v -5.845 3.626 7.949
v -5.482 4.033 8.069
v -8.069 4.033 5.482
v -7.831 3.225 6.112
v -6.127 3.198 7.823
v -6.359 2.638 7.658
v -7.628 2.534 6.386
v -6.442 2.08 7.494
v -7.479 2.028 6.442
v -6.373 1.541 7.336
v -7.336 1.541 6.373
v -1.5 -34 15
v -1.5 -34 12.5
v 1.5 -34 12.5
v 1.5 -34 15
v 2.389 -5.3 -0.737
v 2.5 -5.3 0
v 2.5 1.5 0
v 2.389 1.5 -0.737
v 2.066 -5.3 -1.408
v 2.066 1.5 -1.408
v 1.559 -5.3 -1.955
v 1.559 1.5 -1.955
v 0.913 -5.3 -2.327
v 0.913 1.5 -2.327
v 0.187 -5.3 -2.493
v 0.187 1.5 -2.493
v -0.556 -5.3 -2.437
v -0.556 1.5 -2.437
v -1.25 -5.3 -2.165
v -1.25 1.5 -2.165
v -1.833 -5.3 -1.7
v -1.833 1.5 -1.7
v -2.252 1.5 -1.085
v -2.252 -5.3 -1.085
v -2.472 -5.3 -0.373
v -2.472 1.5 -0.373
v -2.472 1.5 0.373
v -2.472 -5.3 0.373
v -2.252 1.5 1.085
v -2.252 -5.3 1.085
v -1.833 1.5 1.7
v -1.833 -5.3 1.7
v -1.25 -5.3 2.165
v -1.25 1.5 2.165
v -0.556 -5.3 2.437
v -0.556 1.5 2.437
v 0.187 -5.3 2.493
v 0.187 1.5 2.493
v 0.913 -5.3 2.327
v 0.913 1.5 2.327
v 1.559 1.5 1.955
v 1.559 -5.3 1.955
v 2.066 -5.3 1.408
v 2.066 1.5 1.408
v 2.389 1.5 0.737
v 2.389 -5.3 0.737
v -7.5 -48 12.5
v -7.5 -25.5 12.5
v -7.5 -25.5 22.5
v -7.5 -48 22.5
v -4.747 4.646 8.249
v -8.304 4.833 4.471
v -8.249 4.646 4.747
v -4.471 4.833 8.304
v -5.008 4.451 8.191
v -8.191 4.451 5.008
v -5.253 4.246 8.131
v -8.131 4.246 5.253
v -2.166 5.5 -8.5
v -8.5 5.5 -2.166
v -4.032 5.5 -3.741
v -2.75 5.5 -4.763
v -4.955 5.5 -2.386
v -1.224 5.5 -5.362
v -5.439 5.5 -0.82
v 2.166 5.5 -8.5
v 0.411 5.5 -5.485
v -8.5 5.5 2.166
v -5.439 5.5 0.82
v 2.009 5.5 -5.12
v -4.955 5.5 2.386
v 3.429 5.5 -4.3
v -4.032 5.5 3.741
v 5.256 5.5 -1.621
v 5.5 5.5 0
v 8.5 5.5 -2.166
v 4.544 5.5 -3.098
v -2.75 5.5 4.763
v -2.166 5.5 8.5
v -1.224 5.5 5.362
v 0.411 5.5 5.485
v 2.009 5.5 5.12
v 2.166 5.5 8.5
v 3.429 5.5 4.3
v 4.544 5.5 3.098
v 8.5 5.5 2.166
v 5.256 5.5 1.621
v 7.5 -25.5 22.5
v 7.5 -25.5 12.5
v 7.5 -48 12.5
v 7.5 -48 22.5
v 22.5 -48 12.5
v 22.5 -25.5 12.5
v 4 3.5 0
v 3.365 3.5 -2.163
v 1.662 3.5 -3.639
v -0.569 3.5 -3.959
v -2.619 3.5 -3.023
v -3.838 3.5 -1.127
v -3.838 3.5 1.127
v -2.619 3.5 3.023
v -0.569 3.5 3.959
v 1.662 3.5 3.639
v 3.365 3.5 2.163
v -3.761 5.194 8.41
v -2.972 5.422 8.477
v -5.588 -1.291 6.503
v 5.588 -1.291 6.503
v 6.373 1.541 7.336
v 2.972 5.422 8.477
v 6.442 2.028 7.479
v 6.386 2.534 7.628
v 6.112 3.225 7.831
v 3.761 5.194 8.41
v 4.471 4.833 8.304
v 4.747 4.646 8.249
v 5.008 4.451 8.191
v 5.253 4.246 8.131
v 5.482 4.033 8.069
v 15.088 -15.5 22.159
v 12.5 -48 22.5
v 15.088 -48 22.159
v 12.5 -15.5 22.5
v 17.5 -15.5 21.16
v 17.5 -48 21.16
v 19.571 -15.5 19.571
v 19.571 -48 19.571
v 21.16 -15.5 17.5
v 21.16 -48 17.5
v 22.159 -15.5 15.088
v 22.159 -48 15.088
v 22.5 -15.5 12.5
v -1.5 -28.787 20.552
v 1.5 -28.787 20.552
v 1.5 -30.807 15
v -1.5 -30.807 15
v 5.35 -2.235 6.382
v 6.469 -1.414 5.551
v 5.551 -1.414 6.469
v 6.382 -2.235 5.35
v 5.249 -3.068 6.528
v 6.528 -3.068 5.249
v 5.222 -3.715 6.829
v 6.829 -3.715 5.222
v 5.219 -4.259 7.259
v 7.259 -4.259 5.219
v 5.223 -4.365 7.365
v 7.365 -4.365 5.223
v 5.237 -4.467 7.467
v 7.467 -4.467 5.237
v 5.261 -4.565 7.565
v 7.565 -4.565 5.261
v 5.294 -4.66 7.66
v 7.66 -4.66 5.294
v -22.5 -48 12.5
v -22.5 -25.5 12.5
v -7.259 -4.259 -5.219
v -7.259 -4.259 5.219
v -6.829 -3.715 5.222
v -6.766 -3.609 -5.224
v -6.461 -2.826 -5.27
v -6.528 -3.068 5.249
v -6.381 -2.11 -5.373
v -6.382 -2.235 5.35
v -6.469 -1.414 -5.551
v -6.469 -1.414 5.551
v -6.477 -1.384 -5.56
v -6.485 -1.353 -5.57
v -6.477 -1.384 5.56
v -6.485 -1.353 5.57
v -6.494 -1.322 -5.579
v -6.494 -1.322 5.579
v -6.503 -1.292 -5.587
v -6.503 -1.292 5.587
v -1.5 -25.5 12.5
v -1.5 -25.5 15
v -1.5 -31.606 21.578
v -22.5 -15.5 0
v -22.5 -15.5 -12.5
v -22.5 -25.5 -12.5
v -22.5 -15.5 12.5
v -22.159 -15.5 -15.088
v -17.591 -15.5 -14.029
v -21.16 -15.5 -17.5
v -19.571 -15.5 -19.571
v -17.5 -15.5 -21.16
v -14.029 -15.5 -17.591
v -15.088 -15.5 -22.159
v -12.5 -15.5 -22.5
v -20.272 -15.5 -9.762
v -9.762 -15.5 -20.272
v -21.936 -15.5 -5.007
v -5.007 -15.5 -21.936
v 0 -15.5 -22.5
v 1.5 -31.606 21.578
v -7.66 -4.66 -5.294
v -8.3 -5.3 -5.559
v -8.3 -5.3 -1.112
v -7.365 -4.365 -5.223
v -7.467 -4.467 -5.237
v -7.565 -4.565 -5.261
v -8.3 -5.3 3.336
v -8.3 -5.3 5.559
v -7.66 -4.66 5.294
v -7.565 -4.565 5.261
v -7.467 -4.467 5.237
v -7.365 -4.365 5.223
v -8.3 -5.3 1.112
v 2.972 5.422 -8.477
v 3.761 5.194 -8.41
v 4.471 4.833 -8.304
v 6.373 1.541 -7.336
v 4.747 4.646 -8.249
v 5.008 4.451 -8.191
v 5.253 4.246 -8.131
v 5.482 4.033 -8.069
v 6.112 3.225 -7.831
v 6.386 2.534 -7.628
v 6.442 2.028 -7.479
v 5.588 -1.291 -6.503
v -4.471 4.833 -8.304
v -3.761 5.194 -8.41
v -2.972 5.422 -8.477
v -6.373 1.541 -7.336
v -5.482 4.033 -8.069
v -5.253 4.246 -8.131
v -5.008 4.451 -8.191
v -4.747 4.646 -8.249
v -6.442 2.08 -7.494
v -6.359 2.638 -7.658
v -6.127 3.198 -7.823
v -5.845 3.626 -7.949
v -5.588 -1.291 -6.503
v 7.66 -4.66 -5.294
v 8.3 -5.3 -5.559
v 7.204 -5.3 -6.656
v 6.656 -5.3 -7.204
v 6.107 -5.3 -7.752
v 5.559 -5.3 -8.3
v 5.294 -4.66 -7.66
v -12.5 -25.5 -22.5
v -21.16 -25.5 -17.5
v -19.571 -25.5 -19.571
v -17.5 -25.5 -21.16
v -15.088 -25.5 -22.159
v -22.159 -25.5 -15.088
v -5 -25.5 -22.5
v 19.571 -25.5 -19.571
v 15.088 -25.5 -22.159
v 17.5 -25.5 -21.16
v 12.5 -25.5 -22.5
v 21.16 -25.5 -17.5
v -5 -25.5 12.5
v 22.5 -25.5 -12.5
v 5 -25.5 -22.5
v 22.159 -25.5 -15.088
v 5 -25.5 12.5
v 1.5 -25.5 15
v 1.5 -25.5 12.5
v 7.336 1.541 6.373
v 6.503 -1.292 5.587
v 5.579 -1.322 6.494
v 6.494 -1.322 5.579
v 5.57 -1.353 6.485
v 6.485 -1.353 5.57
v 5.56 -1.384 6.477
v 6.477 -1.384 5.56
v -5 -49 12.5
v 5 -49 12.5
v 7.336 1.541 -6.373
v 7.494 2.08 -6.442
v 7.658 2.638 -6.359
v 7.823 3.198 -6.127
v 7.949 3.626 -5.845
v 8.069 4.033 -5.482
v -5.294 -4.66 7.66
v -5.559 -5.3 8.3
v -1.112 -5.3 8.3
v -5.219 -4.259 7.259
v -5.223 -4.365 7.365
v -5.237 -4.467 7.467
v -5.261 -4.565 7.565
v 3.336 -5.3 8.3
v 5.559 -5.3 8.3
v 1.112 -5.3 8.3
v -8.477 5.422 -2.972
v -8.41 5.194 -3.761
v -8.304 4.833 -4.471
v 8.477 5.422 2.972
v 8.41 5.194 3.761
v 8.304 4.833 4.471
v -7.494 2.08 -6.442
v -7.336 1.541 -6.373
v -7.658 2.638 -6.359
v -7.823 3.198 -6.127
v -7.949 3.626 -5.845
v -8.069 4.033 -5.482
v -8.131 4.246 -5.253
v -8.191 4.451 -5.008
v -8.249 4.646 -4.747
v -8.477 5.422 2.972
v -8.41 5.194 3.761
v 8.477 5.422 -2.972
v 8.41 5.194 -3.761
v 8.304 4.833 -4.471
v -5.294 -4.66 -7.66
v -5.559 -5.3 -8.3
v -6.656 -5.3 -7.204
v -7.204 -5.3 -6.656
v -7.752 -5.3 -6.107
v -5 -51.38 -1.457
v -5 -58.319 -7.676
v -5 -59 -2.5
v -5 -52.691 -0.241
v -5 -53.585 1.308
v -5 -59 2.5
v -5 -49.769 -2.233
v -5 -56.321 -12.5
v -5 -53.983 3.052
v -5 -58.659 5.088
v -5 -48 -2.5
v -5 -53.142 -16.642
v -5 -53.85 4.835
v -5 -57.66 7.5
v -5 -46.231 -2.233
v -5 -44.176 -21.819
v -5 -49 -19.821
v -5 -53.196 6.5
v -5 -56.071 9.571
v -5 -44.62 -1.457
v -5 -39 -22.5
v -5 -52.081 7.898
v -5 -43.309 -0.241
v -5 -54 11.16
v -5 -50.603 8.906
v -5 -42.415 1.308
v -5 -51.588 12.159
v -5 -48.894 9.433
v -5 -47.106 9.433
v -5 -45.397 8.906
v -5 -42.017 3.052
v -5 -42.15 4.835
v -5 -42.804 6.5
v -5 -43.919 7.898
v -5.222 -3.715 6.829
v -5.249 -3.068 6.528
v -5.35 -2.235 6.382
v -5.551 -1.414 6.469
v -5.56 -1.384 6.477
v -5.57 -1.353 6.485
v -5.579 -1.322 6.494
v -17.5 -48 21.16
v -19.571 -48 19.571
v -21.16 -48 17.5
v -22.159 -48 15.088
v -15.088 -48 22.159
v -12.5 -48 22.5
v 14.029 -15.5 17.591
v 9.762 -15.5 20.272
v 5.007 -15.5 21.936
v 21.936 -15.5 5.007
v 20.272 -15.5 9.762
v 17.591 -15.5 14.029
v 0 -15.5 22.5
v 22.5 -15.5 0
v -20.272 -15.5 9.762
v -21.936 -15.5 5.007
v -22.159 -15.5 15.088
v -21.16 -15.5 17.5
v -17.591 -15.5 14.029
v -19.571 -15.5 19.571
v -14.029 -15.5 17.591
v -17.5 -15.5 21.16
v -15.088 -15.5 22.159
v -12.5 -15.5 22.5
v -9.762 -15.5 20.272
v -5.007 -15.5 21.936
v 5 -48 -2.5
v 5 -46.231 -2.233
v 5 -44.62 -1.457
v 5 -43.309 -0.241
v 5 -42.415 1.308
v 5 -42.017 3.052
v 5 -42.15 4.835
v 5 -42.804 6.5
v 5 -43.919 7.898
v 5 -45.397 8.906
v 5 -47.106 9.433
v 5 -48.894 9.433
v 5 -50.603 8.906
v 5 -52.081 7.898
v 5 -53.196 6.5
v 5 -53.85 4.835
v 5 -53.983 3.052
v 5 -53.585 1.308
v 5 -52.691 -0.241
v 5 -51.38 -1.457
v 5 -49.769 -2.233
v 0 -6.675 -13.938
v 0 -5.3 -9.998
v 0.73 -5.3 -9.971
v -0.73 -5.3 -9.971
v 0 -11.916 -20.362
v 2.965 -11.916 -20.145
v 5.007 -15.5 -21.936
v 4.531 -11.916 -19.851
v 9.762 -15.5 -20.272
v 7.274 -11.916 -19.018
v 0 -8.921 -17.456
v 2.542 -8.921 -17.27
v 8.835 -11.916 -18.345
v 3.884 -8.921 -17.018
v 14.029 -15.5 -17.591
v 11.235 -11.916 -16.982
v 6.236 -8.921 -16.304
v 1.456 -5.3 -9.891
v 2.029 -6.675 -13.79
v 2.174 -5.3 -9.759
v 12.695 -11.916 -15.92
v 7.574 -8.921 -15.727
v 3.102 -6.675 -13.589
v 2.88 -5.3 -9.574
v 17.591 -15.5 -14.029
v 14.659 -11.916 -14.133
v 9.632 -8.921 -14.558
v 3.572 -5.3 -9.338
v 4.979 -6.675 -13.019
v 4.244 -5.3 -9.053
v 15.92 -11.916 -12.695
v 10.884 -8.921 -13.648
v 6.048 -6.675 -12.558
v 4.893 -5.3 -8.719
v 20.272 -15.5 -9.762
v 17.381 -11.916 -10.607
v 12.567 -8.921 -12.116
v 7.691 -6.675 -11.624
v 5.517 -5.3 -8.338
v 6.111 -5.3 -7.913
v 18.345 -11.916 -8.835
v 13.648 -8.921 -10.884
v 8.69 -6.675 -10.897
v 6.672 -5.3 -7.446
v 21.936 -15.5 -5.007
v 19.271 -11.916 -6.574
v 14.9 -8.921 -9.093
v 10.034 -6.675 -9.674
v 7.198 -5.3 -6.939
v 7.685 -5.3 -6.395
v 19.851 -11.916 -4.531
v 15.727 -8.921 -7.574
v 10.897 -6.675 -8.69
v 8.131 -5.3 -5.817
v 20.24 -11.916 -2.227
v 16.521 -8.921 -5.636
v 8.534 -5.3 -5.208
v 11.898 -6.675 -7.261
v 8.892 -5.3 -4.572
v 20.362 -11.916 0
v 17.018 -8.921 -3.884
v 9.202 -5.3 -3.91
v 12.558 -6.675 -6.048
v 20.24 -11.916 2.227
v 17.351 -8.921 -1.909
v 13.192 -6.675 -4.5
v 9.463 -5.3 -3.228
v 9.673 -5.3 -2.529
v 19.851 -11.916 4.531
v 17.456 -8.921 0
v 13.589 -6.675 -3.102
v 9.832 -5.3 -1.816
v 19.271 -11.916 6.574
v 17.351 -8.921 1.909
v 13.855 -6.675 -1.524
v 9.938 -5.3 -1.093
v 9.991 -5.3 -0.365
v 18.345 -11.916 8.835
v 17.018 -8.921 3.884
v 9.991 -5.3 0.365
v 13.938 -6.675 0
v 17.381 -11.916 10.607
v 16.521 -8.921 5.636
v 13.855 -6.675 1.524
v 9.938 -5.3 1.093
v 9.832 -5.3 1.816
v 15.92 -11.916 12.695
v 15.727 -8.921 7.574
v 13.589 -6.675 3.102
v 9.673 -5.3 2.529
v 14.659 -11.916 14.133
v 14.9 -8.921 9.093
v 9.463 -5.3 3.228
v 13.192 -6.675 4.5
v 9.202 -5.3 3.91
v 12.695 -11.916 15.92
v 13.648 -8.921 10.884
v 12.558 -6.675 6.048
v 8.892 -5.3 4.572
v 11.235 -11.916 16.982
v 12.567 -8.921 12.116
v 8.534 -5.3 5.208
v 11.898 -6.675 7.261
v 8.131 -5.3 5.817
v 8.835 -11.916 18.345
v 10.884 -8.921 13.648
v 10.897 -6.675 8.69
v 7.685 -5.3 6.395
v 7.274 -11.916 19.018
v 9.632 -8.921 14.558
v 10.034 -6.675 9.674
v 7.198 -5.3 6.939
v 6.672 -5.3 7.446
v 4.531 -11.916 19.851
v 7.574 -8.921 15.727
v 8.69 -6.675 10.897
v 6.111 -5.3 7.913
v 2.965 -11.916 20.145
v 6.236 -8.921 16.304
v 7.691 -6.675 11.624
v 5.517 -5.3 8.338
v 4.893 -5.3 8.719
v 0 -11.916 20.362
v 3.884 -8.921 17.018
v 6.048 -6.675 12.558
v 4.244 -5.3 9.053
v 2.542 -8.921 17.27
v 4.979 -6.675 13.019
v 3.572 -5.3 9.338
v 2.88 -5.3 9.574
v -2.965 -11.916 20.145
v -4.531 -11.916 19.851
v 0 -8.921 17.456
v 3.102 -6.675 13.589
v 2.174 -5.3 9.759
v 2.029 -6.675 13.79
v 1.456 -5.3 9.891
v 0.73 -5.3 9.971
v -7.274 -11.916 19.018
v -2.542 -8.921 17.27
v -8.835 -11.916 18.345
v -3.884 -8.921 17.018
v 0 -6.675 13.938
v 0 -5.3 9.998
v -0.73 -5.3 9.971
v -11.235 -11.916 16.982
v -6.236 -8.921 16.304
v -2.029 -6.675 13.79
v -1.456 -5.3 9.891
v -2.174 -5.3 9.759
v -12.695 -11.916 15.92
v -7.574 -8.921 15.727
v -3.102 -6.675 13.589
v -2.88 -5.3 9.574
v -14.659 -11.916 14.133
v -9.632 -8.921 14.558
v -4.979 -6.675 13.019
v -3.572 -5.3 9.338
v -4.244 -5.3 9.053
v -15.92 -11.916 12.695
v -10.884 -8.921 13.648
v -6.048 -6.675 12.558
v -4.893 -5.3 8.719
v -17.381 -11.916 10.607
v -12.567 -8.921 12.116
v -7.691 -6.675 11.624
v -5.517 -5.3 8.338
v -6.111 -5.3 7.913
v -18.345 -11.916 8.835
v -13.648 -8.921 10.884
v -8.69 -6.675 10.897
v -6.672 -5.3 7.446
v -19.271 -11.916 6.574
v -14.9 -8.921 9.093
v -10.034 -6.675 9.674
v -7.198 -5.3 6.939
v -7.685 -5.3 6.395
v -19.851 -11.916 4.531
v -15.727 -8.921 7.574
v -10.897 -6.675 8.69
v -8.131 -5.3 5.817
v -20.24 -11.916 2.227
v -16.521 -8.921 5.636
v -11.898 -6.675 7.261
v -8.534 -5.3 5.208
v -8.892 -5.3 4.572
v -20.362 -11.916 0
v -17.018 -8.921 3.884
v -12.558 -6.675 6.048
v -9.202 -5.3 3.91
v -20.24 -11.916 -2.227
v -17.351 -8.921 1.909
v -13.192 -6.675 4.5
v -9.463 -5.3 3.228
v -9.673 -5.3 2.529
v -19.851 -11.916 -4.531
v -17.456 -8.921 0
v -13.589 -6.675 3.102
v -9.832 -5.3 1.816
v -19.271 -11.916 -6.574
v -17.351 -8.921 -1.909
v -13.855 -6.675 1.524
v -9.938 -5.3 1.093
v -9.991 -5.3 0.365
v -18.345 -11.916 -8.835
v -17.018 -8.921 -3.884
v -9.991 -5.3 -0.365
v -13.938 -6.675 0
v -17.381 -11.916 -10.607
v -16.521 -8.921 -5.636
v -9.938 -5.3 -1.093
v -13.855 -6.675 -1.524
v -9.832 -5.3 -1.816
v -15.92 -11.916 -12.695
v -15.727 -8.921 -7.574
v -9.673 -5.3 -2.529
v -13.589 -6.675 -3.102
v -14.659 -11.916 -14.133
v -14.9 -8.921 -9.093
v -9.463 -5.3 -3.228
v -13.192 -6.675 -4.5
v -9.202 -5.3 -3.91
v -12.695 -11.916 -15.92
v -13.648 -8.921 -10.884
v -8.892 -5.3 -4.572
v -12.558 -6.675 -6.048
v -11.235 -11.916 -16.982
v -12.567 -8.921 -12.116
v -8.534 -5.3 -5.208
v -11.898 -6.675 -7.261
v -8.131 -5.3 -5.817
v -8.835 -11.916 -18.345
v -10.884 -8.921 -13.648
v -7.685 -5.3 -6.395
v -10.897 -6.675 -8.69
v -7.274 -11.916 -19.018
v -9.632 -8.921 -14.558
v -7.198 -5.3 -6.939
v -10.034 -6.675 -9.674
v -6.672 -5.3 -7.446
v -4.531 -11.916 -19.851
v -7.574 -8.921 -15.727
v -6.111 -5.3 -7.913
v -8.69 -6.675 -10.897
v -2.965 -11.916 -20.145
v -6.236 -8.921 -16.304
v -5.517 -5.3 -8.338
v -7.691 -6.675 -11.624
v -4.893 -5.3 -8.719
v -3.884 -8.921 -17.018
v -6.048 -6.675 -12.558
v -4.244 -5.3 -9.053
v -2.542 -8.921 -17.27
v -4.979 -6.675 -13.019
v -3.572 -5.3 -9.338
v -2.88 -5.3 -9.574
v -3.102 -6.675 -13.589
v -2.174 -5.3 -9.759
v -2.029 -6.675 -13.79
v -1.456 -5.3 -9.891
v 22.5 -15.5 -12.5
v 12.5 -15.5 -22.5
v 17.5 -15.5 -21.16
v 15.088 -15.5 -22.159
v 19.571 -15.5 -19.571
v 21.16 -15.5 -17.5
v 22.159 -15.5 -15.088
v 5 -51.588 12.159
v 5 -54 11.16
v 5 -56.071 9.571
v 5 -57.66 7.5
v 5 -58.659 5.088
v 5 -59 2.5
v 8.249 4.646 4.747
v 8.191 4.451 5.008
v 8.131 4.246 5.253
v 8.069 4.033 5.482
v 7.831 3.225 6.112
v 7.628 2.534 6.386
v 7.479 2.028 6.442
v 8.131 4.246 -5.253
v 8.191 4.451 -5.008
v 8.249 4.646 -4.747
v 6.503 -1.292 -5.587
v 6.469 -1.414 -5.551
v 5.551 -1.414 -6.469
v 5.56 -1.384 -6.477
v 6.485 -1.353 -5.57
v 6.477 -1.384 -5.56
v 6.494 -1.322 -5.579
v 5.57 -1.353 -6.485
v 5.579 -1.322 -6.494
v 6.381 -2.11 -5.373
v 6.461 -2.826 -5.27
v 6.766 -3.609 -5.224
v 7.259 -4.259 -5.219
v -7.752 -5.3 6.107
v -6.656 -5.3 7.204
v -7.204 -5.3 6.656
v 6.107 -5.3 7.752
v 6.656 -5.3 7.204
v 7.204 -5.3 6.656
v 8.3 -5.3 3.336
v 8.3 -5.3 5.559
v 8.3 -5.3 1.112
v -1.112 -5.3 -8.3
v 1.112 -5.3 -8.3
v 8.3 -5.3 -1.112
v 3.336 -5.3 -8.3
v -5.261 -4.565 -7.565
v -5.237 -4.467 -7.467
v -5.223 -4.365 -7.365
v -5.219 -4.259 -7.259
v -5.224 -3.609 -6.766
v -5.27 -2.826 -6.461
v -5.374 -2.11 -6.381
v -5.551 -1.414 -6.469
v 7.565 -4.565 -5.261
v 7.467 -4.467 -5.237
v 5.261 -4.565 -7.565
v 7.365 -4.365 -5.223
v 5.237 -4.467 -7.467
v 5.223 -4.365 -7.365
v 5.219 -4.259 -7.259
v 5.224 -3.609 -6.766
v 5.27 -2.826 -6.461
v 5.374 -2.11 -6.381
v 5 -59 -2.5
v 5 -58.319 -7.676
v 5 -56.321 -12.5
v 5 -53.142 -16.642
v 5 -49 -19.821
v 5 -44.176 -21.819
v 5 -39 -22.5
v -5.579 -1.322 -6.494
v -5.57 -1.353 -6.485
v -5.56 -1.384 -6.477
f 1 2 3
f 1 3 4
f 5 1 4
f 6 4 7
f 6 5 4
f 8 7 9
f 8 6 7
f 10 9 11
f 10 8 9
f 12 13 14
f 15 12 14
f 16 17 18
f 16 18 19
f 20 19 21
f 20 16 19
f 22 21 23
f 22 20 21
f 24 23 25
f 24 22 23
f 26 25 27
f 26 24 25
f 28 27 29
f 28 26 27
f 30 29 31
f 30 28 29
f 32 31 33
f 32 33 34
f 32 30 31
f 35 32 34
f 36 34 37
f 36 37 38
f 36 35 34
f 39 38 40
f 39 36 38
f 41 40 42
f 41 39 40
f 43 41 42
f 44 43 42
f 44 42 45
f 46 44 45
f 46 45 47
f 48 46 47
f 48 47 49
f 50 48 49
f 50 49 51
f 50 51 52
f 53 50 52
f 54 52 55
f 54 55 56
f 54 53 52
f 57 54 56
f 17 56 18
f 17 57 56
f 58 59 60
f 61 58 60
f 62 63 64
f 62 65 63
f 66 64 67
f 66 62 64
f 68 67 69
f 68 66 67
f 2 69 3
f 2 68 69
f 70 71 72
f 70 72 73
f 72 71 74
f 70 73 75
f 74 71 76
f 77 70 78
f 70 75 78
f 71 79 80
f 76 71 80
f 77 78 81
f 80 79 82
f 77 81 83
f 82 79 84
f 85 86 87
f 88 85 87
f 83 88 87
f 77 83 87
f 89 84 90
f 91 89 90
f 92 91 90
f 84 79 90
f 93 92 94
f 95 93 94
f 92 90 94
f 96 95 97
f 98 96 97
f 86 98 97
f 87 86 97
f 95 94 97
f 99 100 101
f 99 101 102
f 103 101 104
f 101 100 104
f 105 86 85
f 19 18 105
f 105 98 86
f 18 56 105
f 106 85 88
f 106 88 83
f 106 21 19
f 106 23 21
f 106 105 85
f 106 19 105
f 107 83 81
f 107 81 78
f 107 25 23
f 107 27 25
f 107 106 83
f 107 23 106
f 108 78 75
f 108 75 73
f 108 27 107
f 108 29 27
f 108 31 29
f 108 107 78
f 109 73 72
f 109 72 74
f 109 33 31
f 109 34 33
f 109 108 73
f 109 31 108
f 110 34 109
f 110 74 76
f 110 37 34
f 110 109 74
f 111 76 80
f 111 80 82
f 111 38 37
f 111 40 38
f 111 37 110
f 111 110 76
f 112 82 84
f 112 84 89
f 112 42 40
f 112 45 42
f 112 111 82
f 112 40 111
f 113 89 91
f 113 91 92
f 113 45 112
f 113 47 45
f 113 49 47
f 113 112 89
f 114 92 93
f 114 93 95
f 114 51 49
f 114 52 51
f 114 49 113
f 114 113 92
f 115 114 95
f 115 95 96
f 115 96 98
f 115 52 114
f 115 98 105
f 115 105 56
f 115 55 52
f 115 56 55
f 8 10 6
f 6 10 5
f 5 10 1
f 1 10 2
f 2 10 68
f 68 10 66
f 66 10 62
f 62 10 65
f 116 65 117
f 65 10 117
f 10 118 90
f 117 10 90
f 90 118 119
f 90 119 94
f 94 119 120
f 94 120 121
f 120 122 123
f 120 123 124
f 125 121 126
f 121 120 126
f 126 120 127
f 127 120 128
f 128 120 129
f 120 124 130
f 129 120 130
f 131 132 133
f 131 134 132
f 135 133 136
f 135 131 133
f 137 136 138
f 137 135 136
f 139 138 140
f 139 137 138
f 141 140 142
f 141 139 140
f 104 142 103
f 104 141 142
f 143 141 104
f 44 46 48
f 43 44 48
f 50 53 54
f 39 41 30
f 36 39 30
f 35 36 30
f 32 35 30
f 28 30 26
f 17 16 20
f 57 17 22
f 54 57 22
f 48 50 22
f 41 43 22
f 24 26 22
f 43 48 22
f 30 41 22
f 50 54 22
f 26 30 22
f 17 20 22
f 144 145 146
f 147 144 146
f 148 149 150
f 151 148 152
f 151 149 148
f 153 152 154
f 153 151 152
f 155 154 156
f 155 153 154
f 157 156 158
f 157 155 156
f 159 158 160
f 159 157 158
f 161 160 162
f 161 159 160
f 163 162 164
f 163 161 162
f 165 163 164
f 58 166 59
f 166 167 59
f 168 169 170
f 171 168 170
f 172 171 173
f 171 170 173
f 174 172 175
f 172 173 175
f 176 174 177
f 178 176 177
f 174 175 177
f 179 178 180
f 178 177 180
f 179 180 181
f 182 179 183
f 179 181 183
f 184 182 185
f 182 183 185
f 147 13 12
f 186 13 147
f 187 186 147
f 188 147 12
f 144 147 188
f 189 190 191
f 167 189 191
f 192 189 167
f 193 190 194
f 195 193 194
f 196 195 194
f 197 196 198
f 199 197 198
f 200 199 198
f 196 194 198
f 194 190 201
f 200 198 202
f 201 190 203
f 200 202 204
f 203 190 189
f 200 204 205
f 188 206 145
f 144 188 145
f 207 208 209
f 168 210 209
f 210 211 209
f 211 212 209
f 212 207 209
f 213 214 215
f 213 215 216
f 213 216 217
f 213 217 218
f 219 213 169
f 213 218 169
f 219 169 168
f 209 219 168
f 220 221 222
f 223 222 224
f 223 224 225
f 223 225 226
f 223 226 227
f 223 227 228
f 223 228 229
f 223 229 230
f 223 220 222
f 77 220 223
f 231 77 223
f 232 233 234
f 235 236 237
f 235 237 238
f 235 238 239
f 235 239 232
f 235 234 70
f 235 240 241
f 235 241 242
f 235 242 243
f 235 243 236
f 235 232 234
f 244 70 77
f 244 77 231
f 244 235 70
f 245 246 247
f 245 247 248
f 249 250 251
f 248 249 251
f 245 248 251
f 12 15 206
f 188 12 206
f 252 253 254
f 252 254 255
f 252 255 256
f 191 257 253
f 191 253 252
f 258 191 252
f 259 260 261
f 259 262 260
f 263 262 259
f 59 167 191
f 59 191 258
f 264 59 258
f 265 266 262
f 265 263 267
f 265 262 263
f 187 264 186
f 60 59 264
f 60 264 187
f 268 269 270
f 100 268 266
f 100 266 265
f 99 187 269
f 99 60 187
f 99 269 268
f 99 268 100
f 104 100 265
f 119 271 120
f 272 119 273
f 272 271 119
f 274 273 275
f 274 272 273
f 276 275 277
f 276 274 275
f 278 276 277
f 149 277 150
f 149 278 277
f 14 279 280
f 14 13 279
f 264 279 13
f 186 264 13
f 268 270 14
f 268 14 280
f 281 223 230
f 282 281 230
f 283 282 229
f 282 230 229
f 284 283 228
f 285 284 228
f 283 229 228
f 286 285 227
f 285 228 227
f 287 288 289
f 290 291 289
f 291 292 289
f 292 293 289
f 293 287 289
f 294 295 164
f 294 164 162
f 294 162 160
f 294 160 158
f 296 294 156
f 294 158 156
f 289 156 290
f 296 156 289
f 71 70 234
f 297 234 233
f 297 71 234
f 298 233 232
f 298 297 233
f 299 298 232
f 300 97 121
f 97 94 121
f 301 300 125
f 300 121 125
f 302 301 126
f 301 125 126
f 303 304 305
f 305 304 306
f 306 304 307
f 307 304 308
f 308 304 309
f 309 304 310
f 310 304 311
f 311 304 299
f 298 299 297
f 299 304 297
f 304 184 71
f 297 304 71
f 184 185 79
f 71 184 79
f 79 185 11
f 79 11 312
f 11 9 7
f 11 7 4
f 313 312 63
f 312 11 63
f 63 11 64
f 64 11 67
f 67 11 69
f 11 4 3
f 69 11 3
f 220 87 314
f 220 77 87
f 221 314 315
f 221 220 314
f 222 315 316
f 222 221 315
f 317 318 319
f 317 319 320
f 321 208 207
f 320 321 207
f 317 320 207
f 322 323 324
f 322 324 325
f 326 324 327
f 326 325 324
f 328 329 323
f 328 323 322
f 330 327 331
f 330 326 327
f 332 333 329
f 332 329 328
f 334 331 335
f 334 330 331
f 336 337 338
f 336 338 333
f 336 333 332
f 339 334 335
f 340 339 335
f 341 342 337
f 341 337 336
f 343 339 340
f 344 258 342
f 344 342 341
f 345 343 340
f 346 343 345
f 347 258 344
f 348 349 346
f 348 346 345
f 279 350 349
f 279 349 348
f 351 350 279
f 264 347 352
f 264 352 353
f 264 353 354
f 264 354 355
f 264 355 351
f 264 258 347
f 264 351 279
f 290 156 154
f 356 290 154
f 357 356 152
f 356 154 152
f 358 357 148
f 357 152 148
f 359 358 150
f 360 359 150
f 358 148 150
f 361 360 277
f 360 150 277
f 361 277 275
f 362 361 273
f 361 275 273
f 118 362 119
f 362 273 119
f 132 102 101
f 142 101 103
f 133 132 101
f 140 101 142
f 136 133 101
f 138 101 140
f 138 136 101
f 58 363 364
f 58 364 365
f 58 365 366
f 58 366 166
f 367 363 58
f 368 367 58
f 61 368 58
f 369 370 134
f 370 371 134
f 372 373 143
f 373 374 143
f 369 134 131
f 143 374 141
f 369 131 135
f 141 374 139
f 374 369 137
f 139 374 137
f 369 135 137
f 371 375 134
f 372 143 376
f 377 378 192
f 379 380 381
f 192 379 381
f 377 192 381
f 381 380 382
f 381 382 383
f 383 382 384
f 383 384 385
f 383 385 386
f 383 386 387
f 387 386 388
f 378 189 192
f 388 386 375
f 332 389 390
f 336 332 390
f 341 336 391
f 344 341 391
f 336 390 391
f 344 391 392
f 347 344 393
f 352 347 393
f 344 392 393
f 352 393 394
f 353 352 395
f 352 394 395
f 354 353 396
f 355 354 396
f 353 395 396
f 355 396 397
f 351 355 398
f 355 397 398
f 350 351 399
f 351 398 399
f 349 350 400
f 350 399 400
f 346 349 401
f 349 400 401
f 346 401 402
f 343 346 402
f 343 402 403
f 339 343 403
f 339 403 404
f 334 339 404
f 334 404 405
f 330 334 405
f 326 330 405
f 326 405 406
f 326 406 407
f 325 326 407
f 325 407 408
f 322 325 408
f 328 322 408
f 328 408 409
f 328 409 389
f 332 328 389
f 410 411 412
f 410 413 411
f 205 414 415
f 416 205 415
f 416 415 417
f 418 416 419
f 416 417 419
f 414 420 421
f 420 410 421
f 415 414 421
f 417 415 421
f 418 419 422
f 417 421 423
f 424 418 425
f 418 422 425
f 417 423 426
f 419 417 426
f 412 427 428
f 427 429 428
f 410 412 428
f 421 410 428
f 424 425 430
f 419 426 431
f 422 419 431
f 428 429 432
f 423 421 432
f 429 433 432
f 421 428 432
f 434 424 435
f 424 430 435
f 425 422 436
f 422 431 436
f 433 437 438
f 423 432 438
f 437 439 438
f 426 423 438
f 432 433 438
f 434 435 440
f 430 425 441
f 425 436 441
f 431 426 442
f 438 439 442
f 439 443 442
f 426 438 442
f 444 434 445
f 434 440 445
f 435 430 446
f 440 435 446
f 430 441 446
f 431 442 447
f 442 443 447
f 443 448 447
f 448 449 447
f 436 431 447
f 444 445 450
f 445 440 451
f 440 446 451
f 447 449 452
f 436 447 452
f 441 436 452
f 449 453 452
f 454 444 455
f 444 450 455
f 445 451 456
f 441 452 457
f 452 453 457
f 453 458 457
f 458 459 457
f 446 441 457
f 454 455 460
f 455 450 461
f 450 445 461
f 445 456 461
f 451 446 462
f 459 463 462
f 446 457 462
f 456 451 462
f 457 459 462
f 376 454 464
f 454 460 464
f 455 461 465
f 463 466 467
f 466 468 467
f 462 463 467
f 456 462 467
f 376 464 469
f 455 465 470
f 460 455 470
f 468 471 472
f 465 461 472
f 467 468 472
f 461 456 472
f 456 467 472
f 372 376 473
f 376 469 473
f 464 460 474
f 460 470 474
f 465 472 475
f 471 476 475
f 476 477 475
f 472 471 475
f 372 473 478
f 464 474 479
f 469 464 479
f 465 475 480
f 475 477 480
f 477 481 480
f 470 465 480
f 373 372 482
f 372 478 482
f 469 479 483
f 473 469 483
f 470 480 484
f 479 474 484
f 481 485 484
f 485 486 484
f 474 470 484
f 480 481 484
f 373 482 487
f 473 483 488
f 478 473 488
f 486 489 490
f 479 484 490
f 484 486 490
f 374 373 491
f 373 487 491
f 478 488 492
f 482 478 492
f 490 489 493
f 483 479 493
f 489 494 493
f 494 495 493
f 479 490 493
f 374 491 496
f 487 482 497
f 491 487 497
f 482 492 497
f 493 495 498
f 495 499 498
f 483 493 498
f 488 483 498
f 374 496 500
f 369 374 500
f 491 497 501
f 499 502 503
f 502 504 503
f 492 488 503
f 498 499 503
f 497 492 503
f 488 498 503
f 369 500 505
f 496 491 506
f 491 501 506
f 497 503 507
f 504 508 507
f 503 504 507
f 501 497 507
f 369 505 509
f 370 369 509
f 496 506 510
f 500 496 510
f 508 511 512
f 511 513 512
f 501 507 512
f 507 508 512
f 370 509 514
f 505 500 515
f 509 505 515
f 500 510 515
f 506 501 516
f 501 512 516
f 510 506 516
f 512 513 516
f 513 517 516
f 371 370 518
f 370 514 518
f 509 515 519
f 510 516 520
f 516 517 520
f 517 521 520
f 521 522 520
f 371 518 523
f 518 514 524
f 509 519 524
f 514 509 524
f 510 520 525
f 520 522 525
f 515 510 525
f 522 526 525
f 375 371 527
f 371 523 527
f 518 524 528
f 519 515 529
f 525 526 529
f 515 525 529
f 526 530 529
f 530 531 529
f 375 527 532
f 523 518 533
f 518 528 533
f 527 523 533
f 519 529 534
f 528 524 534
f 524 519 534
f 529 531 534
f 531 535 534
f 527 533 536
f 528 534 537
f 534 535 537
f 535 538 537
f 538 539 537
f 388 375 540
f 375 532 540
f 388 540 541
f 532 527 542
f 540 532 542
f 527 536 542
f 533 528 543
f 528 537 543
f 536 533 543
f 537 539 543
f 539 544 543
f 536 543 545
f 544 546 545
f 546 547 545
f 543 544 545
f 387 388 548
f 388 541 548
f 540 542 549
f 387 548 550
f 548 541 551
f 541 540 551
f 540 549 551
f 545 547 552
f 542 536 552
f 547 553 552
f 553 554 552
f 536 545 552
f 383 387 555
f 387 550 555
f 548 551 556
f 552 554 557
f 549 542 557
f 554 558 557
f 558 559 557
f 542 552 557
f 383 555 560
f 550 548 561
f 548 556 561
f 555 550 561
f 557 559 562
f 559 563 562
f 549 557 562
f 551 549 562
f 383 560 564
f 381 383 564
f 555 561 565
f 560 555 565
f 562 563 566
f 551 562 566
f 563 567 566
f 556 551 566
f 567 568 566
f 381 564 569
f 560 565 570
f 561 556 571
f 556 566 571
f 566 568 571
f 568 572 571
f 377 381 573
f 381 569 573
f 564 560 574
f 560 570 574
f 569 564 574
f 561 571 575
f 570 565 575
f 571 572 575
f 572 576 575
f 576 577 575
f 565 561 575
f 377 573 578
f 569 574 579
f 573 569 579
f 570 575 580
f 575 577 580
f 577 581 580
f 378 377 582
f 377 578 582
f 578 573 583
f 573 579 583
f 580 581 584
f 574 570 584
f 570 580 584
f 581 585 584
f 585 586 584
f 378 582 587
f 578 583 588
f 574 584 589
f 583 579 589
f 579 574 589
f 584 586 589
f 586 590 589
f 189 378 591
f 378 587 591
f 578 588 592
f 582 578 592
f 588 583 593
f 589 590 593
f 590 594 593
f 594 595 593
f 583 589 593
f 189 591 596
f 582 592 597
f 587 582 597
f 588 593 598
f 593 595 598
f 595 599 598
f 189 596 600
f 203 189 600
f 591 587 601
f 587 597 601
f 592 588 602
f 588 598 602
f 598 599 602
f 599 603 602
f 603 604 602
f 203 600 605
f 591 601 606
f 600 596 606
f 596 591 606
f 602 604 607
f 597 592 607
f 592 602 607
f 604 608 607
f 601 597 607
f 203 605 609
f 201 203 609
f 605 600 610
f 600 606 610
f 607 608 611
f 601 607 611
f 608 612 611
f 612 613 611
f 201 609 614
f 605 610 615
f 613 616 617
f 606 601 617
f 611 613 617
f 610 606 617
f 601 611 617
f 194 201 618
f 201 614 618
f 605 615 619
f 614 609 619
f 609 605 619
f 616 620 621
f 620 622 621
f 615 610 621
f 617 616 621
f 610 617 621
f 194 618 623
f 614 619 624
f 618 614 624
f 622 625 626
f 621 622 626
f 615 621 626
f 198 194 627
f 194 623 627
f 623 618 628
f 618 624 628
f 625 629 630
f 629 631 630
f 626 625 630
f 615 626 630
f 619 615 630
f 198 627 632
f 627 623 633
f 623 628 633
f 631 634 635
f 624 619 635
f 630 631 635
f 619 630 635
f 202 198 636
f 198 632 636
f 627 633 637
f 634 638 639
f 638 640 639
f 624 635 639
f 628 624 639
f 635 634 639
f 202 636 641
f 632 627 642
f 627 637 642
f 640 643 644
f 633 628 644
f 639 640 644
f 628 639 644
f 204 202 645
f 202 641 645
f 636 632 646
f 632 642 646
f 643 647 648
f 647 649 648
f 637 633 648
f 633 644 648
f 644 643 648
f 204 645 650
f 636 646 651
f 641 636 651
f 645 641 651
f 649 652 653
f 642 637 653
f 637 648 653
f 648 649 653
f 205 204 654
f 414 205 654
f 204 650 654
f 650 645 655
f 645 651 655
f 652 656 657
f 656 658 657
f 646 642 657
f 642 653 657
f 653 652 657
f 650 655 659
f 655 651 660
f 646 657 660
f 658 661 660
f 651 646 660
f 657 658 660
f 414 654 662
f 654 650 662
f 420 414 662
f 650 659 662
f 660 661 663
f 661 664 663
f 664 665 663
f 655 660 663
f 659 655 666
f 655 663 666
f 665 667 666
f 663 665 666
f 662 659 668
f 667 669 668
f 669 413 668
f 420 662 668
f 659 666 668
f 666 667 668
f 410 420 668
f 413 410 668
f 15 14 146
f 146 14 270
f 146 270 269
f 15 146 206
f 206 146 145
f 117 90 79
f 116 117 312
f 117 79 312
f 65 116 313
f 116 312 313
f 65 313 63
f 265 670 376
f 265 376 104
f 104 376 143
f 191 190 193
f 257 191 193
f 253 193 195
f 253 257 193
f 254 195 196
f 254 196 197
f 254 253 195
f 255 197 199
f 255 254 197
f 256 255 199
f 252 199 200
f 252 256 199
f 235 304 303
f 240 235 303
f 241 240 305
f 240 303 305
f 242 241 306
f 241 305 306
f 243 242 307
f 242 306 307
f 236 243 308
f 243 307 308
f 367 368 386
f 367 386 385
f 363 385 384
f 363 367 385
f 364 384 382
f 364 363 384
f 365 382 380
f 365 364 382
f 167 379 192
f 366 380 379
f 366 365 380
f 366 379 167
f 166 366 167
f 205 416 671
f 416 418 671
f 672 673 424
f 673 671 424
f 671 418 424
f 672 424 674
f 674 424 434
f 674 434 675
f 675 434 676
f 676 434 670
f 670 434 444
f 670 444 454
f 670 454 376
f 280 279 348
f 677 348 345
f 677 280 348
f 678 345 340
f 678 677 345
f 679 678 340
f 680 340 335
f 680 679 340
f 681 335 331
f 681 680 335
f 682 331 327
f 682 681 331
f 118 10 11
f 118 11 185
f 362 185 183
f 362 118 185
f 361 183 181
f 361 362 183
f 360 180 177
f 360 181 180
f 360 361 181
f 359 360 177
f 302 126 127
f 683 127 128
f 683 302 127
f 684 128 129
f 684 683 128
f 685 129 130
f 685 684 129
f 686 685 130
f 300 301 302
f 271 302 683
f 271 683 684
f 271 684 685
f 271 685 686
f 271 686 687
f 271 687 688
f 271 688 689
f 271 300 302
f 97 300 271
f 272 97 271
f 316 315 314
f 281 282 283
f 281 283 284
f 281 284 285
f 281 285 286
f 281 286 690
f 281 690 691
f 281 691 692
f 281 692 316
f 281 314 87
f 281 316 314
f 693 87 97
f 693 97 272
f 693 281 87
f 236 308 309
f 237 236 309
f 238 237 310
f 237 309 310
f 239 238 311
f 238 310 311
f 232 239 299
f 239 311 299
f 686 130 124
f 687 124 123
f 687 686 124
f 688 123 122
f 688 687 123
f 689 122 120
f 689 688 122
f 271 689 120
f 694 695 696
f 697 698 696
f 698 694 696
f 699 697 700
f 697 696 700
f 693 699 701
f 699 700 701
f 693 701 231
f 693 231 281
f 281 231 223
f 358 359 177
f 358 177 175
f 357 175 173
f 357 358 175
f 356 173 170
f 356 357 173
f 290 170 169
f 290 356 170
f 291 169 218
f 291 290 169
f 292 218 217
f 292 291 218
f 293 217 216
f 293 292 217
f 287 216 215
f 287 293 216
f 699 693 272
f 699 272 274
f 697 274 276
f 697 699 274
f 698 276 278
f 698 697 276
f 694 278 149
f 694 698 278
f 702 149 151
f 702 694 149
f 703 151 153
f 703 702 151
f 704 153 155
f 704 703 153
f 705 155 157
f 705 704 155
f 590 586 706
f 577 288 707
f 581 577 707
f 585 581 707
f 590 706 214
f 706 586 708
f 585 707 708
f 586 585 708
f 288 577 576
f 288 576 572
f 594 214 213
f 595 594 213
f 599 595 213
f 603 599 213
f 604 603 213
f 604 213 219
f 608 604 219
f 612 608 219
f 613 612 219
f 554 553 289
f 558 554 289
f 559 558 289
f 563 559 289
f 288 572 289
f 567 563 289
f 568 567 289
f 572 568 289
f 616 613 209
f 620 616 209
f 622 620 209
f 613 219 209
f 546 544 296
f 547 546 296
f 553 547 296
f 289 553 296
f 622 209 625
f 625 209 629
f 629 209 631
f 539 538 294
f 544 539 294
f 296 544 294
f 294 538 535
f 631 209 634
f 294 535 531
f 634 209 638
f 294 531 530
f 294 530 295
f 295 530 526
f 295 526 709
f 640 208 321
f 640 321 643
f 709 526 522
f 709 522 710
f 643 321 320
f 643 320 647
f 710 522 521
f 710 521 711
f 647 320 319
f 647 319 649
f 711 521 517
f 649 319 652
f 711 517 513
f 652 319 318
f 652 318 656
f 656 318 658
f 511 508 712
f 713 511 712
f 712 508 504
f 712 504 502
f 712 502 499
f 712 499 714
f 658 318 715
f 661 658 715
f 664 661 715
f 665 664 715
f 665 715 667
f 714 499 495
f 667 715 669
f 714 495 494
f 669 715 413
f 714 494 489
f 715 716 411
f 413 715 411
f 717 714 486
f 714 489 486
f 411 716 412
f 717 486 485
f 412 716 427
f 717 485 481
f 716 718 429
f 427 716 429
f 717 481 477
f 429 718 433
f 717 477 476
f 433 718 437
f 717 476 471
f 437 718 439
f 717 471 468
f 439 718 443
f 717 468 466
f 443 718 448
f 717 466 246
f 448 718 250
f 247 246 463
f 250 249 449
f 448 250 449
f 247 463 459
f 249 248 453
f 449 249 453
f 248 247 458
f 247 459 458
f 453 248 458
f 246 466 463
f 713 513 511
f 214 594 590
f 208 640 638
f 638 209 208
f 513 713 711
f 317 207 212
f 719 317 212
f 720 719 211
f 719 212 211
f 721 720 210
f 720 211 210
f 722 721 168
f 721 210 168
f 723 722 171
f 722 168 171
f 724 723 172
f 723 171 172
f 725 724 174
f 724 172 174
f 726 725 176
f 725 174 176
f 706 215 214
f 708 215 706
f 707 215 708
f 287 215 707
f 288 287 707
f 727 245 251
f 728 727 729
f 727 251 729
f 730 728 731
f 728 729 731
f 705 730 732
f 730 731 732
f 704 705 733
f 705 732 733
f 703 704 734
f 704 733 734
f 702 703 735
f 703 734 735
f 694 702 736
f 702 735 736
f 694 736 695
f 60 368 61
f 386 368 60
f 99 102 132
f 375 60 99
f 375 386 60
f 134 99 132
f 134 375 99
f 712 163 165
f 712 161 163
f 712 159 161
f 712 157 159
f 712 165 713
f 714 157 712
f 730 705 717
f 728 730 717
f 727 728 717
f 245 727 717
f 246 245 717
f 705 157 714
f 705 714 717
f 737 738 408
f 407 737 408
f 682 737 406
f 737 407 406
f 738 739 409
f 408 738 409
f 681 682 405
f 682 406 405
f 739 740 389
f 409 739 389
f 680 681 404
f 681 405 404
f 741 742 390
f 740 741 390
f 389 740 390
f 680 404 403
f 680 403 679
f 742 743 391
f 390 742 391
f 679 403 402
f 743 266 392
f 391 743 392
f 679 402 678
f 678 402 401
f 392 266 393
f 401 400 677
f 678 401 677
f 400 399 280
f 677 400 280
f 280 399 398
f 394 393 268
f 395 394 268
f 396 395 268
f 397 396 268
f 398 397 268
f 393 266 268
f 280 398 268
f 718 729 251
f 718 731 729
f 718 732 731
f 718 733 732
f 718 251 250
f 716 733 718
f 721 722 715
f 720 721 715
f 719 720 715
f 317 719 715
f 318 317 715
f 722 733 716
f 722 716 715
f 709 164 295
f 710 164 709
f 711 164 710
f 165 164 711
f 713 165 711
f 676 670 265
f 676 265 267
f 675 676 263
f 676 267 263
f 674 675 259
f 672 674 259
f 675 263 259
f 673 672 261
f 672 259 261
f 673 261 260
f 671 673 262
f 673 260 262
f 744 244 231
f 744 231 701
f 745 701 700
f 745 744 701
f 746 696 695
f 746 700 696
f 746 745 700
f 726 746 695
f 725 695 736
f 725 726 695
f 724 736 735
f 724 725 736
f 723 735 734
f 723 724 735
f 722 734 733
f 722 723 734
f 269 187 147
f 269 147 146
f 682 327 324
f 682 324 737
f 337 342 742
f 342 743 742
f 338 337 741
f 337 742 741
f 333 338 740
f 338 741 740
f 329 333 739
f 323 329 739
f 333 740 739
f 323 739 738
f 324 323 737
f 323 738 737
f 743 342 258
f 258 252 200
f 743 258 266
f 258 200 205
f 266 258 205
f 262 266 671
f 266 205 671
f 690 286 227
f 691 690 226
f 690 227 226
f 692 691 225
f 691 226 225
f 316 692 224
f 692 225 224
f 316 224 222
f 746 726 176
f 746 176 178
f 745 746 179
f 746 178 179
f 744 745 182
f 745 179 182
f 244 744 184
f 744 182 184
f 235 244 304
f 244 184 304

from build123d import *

# Parameters (mm, degrees)
SKETCH4_W           = 17
SKETCH4_H           = 11
BOSS_EXTRUDE2_DEPTH = 8.5
CUT_EXTRUDE1_DEPTH  = 13.5
CUT_EXTRUDE2_DEPTH  = 13.5
CUT_EXTRUDE3_DEPTH  = 13.5
CUT_EXTRUDE4_DEPTH  = 13.5
FILLET1_R           = 2
SKETCH16_W          = 45
SKETCH16_H          = 45
BOSS_EXTRUDE3_DEPTH = 10
SKETCH17_W          = 10
SKETCH17_H          = 35
BOSS_EXTRUDE4_DEPTH = 33.5
SKETCH18_W          = 15
SKETCH18_H          = 10
BOSS_EXTRUDE5_DEPTH = 22.5
SKETCH19_R          = 6
CUT_EXTRUDE5_DEPTH  = 28.5000001
FILLET3_R           = 10
FILLET4_R           = 20
SKETCH20_W          = 3
SKETCH20_H          = 8.5
BOSS_EXTRUDE6_DEPTH = 2.5
BOSS_EXTRUDE7_DEPTH = 3


with BuildPart() as part:
    # Sketch4 → Boss-Extrude2 (new body, symmetric)
    with BuildSketch(Plane.XY):
        Rectangle(SKETCH4_W, SKETCH4_H)
    extrude(amount=BOSS_EXTRUDE2_DEPTH, both=True)

    # Sketch5 → Cut-Extrude1 (cut, symmetric)
    with BuildSketch(Plane(origin=(0, 0, 0), x_dir=(0, 0, -1), z_dir=(1, 0, 0))):
        with BuildLine():
            Line((8.5, 5.5), (6.502509808, -1.291466653))
            ThreePointArc((6.502509808, -1.291466653), (6.473626767, -2.879228009), (7.259285969, -4.259285969))
            Line((7.259285969, -4.259285969), (8.5, -5.5))
            Line((8.5, -5.5), (8.5, 5.5))
        make_face()
        with BuildLine():
            Line((-8.5, -5.5), (-7.259285969, -4.259285969))
            ThreePointArc((-7.259285969, -4.259285969), (-6.473626767, -2.879228009), (-6.502509808, -1.291466653))
            Line((-6.502509808, -1.291466653), (-8.5, 5.5))
            Line((-8.5, 5.5), (-8.5, -5.5))
        make_face()
    extrude(amount=CUT_EXTRUDE1_DEPTH, both=True, mode=Mode.SUBTRACT)

    # Sketch7 → Cut-Extrude2 (cut, symmetric)
    with BuildSketch(Plane.XY):
        with BuildLine():
            Line((8.5, 5.5), (6.502538332, -1.291517059))
            ThreePointArc((6.502538332, -1.291517059), (6.473662442, -2.879270046), (7.259319467, -4.259319467))
            Line((7.259319467, -4.259319467), (8.5, -5.5))
            Line((8.5, -5.5), (8.5, 5.5))
        make_face()
        with BuildLine():
            Line((-8.5, -5.5), (-7.259319467, -4.259319467))
            ThreePointArc((-7.259319467, -4.259319467), (-6.473662442, -2.879270046), (-6.502538332, -1.291517059))
            Line((-6.502538332, -1.291517059), (-8.5, 5.5))
            Line((-8.5, 5.5), (-8.5, -5.5))
        make_face()
    extrude(amount=CUT_EXTRUDE2_DEPTH, both=True, mode=Mode.SUBTRACT)

    # Sketch11 → Cut-Extrude3 (cut, symmetric)
    with BuildSketch(Plane(origin=(0, 0, 0), x_dir=(0.707106781, 0, -0.707106781), z_dir=(0.707106781, 0, 0.707106781))):
        with BuildLine():
            Line((10, -5.5), (9.159523089, -4.659523089))
            ThreePointArc((9.159523089, -4.659523089), (8.341069319, -3.136306549), (8.499291869, -1.414382965))
            Line((8.499291869, -1.414382965), (9.693462893, 1.541294037))
            ThreePointArc((9.693462893, 1.541294037), (9.908907559, 2.799328578), (9.581873492, 4.033069244))
            ThreePointArc((9.581873492, 4.033069244), (9.013209006, 4.854851227), (8.25, 5.5))
            Line((8.25, 5.5), (14, 5.5))
            Line((14, 5.5), (14, -5.5))
            Line((14, -5.5), (10, -5.5))
        make_face()
        with BuildLine():
            Line((-14, 5.5), (-8.25, 5.5))
            ThreePointArc((-8.25, 5.5), (-9.013209006, 4.854851227), (-9.581873492, 4.033069244))
            ThreePointArc((-9.581873492, 4.033069244), (-9.908907559, 2.799328578), (-9.693462893, 1.541294037))
            Line((-9.693462893, 1.541294037), (-8.499291869, -1.414382965))
            ThreePointArc((-8.499291869, -1.414382965), (-8.341069319, -3.136306549), (-9.159523089, -4.659523089))
            Line((-9.159523089, -4.659523089), (-10, -5.5))
            Line((-10, -5.5), (-14, -5.5))
            Line((-14, -5.5), (-14, 5.5))
        make_face()
    extrude(amount=CUT_EXTRUDE3_DEPTH, both=True, mode=Mode.SUBTRACT)

    # Sketch12 → Cut-Extrude4 (cut, symmetric)
    with BuildSketch(Plane(origin=(0, 0, 0), x_dir=(-0.707106781, 0, -0.707106781), z_dir=(0.707106781, 0, -0.707106781))):
        with BuildLine():
            Line((10, -5.5), (9.159523089, -4.659523089))
            ThreePointArc((9.159523089, -4.659523089), (8.341069319, -3.136306549), (8.499291869, -1.414382965))
            Line((8.499291869, -1.414382965), (9.693462893, 1.541294037))
            ThreePointArc((9.693462893, 1.541294037), (9.908907559, 2.799328578), (9.581873492, 4.033069244))
            ThreePointArc((9.581873492, 4.033069244), (9.013209006, 4.854851227), (8.25, 5.5))
            Line((8.25, 5.5), (14, 5.5))
            Line((14, 5.5), (14, -5.5))
            Line((14, -5.5), (10, -5.5))
        make_face()
        with BuildLine():
            Line((-14, 5.5), (-8.25, 5.5))
            ThreePointArc((-8.25, 5.5), (-9.013209006, 4.854851227), (-9.581873492, 4.033069244))
            ThreePointArc((-9.581873492, 4.033069244), (-9.908907559, 2.799328578), (-9.693462893, 1.541294037))
            Line((-9.693462893, 1.541294037), (-8.499291869, -1.414382965))
            ThreePointArc((-8.499291869, -1.414382965), (-8.341069319, -3.136306549), (-9.159523089, -4.659523089))
            Line((-9.159523089, -4.659523089), (-10, -5.5))
            Line((-10, -5.5), (-14, -5.5))
            Line((-14, -5.5), (-14, 5.5))
        make_face()
    extrude(amount=CUT_EXTRUDE4_DEPTH, both=True, mode=Mode.SUBTRACT)

    # Sketch14 → Cut-Revolve1 (revolve, cut)
    with BuildSketch(Plane.XY):
        Polygon((0, 5.5), (5.5, 5.5), (2.5, 1.5), (2.5, -5.5), (0, -5.5), align=None)
    revolve(axis=Axis((0, -5.5, 0), (0, 1, 0)), mode=Mode.SUBTRACT)

    # Fillet1
    fillet1_edges = [part.edges().sort_by_distance(p)[0] for p in [
        (5.833630945, 5.5, -5.833630945),
        (-5.833630945, 5.5, -5.833630945),
        (-5.833630945, 5.5, 5.833630945),
        (5.833630945, 5.5, 5.833630945),
    ]]
    fillet(fillet1_edges, radius=FILLET1_R)

    # Sketch15 → Revolve1 (revolve)
    with BuildSketch(Plane(origin=(0, 0, 0), x_dir=(0, 0, -1), z_dir=(1, 0, 0))):
        with BuildLine():
            Line((0, -15.5), (22.5, -15.5))
            ThreePointArc((22.5, -15.5), (17.455904629, -8.920713416), (9.9979998, -5.3))
            Line((9.9979998, -5.3), (0, -5.3))
            Line((0, -5.3), (0, -5.5))
            Line((0, -5.5), (0, -15.5))
        make_face()
    revolve(axis=Axis((0, -5.5, 0), (0, -1, 0)))

    # Sketch16 → Boss-Extrude3 (add)
    with BuildSketch(Plane.XZ.offset(15.5)):
        Rectangle(SKETCH16_W, SKETCH16_H)
    extrude(amount=BOSS_EXTRUDE3_DEPTH)

    # Sketch17 → Boss-Extrude4 (add)
    with BuildSketch(Plane.XZ.offset(25.5)):
        with Locations((0, -5)):
            Rectangle(SKETCH17_W, SKETCH17_H)
    extrude(amount=BOSS_EXTRUDE4_DEPTH)

    # Sketch18 → Boss-Extrude5 (add)
    with BuildSketch(Plane.XZ.offset(25.5)):
        with Locations((15, 17.5)):
            Rectangle(SKETCH18_W, SKETCH18_H)
        with Locations((-15, 17.5)):
            Rectangle(SKETCH18_W, SKETCH18_H)
    extrude(amount=BOSS_EXTRUDE5_DEPTH)

    # Sketch19 → Cut-Extrude5 (cut, through all)
    with BuildSketch(Plane(origin=(5, 0, 0), x_dir=(0, 0, -1), z_dir=(1, 0, 0))):
        with Locations((-3.5, -48)):
            Circle(SKETCH19_R)
    extrude(amount=-CUT_EXTRUDE5_DEPTH, mode=Mode.SUBTRACT)

    # Fillet3
    fillet3_edges = [part.edges().sort_by_distance(p)[0] for p in [
        (-22.5, -31.75, 22.5),
        (22.5, -31.75, 22.5),
        (-22.5, -20.5, -22.5),
        (22.5, -20.5, -22.5),
        (0, -59, 12.5),
    ]]
    fillet(fillet3_edges, radius=FILLET3_R)

    # Fillet4
    fillet4_edges = [part.edges().sort_by_distance(p)[0] for p in [
        (0, -59, -22.5),
    ]]
    fillet(fillet4_edges, radius=FILLET4_R)

    # Sketch20 → Boss-Extrude6 (add)
    with BuildSketch(Plane.XY.offset(12.5)):
        with Locations((0, -29.75)):
            Rectangle(SKETCH20_W, SKETCH20_H)
    extrude(amount=BOSS_EXTRUDE6_DEPTH)

    # Sketch21 → Boss-Extrude7 (add)
    with BuildSketch(Plane(origin=(1.5, 0, 0), x_dir=(0, 0, -1), z_dir=(1, 0, 0))):
        Polygon((-15, -30.807466683), (-15, -34), (-21.577848346, -31.605858997), (-20.551787916, -28.786781134), align=None)
    extrude(amount=-BOSS_EXTRUDE7_DEPTH)


solid = part.part
